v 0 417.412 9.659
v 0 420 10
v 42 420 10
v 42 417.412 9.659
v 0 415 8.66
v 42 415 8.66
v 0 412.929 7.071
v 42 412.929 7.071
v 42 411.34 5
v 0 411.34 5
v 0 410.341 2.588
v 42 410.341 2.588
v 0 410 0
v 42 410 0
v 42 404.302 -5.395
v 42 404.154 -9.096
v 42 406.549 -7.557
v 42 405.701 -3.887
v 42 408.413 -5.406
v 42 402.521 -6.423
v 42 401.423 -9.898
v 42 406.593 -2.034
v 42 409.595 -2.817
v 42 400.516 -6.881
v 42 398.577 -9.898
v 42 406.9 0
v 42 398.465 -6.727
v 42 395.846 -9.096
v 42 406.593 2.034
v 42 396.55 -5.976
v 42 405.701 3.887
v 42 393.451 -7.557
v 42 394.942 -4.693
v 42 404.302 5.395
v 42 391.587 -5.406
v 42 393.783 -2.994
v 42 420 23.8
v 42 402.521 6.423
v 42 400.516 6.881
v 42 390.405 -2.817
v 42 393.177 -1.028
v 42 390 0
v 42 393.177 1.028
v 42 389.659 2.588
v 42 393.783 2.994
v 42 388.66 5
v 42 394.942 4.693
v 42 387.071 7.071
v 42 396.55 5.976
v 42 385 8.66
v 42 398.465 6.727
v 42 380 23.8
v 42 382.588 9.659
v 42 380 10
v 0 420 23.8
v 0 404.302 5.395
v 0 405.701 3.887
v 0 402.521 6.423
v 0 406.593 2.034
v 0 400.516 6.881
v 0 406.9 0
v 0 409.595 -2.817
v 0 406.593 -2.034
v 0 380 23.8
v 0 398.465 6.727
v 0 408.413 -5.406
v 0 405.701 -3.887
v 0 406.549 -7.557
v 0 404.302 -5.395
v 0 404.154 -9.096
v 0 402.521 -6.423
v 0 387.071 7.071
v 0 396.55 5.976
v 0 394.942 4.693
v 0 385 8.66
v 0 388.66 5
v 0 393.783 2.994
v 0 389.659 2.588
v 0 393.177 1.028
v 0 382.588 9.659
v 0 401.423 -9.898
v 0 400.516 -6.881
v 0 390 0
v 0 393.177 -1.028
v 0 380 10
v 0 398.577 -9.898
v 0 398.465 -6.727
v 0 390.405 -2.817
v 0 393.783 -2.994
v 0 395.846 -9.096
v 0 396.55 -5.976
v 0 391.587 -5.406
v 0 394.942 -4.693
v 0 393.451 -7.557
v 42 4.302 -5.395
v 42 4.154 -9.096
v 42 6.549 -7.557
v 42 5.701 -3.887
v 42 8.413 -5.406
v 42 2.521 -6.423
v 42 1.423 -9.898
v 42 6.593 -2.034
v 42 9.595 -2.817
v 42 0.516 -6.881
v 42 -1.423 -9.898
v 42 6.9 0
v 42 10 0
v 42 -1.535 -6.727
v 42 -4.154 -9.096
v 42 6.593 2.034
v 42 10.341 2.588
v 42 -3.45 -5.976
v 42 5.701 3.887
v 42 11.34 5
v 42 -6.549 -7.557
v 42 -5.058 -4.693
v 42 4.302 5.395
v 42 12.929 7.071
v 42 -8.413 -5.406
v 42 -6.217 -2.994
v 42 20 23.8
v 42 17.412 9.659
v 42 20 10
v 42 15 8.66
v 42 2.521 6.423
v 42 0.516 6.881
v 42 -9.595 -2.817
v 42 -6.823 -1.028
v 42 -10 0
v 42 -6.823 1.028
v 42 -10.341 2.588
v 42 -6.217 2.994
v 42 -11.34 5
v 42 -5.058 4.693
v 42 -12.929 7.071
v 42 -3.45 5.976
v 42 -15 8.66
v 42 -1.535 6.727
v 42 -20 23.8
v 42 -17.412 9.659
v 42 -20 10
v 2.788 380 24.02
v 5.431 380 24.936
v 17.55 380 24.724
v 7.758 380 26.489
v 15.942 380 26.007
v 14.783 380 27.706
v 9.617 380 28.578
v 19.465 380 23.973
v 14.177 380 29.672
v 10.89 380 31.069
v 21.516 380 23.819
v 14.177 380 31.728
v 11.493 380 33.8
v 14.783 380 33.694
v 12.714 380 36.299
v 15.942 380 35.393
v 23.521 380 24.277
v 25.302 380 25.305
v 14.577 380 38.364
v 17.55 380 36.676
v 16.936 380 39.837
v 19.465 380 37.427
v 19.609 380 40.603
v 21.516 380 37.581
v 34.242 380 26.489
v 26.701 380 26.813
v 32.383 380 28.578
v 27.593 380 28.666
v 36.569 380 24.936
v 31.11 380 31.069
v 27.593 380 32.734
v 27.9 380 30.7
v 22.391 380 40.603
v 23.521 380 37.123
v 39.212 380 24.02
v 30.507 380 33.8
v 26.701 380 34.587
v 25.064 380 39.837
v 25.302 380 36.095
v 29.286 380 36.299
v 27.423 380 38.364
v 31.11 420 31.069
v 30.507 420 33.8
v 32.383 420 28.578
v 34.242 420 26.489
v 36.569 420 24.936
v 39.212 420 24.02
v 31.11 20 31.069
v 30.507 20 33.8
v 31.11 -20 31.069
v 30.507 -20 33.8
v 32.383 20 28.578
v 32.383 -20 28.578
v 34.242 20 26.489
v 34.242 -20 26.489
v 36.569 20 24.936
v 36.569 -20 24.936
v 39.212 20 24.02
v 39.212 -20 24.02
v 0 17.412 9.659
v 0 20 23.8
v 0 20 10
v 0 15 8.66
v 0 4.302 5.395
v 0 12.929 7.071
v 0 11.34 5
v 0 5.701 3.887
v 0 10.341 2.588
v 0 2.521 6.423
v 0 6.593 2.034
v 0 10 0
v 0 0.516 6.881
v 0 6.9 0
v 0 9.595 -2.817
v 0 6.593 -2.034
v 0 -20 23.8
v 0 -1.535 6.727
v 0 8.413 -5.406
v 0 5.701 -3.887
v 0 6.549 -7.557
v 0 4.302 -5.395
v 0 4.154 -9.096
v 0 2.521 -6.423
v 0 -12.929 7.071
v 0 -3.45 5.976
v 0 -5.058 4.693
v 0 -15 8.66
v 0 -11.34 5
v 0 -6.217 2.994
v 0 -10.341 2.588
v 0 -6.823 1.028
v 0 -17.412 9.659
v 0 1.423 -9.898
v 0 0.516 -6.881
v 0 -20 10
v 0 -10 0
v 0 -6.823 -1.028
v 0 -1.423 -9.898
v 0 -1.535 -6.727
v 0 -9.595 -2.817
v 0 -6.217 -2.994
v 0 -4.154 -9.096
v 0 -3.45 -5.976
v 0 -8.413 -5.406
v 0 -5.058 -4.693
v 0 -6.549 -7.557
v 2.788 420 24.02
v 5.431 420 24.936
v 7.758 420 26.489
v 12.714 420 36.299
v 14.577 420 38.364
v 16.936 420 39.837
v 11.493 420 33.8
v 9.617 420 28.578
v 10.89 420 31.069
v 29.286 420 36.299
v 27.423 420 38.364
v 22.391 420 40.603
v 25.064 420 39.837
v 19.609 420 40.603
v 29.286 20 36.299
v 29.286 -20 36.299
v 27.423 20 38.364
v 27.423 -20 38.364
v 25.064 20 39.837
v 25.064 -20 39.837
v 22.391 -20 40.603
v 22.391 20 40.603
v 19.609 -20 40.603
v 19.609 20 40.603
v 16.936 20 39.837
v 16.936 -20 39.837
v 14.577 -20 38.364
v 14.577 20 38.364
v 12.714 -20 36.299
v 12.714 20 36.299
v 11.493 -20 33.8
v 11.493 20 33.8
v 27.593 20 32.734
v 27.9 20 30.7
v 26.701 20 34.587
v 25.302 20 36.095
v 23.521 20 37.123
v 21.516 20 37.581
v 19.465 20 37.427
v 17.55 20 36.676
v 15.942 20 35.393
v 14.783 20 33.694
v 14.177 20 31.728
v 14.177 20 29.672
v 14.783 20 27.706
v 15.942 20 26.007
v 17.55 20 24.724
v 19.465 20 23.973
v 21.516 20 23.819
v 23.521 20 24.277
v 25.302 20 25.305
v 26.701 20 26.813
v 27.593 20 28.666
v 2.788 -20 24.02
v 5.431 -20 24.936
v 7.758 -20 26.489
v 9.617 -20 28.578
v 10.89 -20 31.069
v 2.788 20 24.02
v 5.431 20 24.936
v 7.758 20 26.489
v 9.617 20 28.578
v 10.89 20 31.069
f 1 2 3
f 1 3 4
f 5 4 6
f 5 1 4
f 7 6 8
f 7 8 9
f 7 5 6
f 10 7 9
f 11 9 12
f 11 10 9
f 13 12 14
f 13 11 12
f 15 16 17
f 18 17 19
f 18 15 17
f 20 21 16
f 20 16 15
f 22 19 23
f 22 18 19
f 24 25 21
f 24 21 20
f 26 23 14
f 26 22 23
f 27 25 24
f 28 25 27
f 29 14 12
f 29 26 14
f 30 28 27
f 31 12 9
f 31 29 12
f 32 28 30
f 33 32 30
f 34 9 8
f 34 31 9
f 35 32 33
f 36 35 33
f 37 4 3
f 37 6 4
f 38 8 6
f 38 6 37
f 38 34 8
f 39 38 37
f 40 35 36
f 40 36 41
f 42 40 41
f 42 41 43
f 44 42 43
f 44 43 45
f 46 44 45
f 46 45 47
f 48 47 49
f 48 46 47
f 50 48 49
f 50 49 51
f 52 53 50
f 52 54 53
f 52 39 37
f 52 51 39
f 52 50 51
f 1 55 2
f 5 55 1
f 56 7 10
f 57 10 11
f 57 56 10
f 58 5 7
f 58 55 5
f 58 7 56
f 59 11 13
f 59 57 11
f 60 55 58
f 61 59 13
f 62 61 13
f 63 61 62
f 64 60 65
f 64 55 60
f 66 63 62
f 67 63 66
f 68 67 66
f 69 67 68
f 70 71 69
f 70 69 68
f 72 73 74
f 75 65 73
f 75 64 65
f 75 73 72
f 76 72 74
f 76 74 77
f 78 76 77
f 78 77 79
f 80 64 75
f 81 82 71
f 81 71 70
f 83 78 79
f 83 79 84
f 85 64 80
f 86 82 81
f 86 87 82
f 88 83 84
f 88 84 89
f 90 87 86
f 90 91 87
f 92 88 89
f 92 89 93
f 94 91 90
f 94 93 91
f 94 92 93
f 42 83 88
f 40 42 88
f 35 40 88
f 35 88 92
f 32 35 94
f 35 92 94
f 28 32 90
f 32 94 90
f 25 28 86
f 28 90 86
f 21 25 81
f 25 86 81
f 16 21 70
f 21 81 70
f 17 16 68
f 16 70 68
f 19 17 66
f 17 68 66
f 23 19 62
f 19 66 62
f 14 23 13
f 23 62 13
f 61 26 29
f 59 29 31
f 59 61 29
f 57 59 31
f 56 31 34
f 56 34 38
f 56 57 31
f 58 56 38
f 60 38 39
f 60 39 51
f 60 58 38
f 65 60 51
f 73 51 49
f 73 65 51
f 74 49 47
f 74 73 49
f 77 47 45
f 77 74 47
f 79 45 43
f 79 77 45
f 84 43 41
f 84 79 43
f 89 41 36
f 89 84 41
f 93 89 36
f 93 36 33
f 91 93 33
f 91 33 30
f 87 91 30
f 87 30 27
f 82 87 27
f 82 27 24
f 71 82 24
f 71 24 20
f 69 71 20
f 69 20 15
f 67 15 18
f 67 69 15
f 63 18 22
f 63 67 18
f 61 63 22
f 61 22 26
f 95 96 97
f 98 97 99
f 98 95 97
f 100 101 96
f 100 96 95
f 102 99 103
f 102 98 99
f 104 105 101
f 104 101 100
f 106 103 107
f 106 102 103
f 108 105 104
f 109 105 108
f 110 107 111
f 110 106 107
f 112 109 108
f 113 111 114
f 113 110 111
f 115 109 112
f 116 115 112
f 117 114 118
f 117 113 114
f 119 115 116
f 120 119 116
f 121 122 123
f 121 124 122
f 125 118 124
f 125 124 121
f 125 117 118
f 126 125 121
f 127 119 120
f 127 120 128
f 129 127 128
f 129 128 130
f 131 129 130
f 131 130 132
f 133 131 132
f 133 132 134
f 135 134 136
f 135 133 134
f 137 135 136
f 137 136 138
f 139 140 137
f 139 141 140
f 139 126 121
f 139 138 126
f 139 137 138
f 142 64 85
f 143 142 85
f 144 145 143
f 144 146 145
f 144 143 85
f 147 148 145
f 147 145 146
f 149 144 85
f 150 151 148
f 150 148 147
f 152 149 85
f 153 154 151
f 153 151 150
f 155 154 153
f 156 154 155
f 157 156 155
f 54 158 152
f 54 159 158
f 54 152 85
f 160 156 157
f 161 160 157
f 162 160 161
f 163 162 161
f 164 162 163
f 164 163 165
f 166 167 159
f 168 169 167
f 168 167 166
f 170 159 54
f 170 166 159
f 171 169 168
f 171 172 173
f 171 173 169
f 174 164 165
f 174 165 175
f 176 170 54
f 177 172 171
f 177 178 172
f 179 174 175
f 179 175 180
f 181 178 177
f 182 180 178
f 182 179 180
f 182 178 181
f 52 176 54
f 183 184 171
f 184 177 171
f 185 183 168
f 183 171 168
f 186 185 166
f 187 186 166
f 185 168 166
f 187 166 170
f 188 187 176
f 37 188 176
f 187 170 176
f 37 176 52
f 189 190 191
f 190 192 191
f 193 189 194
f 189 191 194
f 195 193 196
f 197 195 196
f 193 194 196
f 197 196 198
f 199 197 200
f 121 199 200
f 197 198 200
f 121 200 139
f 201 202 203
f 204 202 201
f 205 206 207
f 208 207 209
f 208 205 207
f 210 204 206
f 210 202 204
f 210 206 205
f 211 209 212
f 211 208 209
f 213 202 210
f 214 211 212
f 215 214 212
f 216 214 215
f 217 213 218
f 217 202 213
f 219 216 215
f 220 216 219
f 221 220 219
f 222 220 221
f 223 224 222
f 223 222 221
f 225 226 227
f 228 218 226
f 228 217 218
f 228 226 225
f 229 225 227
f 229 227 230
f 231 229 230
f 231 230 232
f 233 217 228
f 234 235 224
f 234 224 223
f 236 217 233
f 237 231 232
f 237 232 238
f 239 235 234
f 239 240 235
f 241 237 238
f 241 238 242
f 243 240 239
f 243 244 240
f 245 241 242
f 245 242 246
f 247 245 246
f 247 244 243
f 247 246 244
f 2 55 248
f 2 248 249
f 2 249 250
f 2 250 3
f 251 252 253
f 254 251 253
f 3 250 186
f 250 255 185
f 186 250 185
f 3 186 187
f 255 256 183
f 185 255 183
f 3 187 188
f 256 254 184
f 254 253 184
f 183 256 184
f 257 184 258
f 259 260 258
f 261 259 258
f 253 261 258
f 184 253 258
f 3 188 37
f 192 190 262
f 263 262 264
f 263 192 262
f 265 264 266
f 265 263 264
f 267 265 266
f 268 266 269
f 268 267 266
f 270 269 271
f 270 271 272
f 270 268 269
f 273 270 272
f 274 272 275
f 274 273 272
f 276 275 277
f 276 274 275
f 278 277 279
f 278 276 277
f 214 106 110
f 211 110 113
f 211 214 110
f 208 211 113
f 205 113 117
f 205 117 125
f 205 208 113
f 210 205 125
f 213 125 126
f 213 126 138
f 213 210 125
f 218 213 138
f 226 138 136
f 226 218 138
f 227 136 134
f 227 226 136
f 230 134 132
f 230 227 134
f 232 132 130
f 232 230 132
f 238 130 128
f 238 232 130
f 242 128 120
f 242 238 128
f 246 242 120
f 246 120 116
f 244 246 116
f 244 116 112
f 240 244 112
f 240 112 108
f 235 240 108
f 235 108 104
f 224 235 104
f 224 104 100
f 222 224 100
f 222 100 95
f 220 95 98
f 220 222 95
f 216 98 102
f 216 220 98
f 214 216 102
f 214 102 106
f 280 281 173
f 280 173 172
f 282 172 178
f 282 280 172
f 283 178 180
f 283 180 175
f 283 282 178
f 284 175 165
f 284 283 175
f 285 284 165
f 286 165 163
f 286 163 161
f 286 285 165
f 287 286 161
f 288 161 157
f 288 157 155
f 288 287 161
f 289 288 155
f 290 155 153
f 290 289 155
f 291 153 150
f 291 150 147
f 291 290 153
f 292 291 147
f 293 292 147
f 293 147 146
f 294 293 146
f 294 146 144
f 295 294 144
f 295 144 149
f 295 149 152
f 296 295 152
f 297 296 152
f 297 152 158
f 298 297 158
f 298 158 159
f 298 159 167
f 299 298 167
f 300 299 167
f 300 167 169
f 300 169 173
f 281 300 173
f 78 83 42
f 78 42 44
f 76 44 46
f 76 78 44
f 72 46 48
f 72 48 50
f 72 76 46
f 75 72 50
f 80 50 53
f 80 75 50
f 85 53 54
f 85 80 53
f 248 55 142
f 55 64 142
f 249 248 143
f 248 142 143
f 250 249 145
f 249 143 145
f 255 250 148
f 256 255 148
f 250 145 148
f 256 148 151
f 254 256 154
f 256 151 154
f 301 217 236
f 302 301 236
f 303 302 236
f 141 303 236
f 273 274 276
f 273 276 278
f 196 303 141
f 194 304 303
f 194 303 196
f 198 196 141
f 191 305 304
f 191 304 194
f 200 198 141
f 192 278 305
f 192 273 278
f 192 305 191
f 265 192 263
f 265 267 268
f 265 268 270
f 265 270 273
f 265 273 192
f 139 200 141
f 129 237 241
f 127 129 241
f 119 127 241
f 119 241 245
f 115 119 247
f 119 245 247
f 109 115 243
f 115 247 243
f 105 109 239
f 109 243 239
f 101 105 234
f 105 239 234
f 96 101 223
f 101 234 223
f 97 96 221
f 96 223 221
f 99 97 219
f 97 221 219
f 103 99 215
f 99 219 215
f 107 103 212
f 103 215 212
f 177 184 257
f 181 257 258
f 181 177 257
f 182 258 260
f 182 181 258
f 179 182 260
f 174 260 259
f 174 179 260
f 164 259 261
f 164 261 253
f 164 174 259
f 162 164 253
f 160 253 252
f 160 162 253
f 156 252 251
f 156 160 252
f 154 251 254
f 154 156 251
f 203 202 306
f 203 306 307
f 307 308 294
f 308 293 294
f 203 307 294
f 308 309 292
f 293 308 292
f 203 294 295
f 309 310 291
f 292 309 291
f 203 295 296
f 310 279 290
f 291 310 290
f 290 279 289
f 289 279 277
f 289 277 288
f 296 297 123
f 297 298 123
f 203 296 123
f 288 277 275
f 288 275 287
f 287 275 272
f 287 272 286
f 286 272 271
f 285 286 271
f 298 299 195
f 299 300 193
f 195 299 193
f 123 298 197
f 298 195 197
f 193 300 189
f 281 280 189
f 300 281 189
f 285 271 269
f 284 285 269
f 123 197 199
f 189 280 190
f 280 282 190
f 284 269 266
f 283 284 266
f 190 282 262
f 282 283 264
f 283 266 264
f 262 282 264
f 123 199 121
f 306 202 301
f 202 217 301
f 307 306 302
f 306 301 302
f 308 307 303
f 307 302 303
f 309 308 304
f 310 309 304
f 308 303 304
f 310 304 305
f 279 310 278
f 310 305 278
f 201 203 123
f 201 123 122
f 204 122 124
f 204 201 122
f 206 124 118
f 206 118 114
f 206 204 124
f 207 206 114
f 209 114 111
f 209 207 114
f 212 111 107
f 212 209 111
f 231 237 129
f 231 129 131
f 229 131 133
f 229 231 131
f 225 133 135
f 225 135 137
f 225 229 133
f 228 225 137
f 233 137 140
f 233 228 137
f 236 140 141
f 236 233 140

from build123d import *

# Parameters (mm, degrees)
SKETCH011_R  = 6.9
PAD001_DEPTH = 42
SKETCH012_R  = 6.9
PAD002_DEPTH = 42
SKETCH014_R  = 6.9
PAD004_DEPTH = 20
SKETCH015_R  = 6.9
PAD005_DEPTH = 20
SKETCH016_R  = 6.9
PAD006_DEPTH = 440


with BuildPart() as x_axis_sled1:
    # Sketch011 → Pad001 (new body)
    with BuildSketch(Plane.YZ):
        with BuildLine():
            Line((-20, 16.9), (20, 16.9))
            Line((20, 16.9), (20, 10))
            ThreePointArc((20, 10), (12.928932, 7.071068), (10, 0))
            ThreePointArc((-10, 0), (0, -9.999999), (10, 0))
            ThreePointArc((-10, 0), (-12.928932, 7.071068), (-20, 10))
            Line((-20, 10), (-20, 16.9))
        make_face()
        Circle(SKETCH011_R, mode=Mode.SUBTRACT)
    extrude(amount=PAD001_DEPTH)


with BuildPart() as x_axis_sled2:
    # Sketch012 → Pad002 (new body)
    with BuildSketch(Plane(origin=(0, 400, 0), x_dir=(0, 1, 0), z_dir=(1, 0, 0))):
        with BuildLine():
            Line((-20, 16.9), (20, 16.9))
            Line((20, 16.9), (20, 10))
            ThreePointArc((20, 10), (12.928932, 7.071068), (10, 0))
            ThreePointArc((-10, 0), (0, -9.999999), (10, 0))
            ThreePointArc((-10, 0), (-12.928932, 7.071068), (-20, 10))
            Line((-20, 10), (-20, 16.9))
        make_face()
        Circle(SKETCH012_R, mode=Mode.SUBTRACT)
    extrude(amount=PAD002_DEPTH)


with BuildPart() as y_axis_socket1:
    # Sketch014 → Pad004 (new body, symmetric)
    with BuildSketch(Plane.XZ):
        with BuildLine():
            Line((0, 23.8), (0, 16.9))
            Line((0, 16.9), (42, 16.9))
            Line((42, 16.9), (42, 23.8))
            ThreePointArc((30.507366, 33.8), (34.242407, 26.488514), (42, 23.8))
            ThreePointArc((30.507366, 33.8), (21, 40.7), (11.492634, 33.8))
            ThreePointArc((0, 23.8), (7.757593, 26.488514), (11.492634, 33.8))
        make_face()
        with Locations((21, 30.7)):
            Circle(SKETCH014_R, mode=Mode.SUBTRACT)
    extrude(amount=PAD004_DEPTH, both=True)


with BuildPart() as y_axis_socket2:
    # Sketch015 → Pad005 (new body, symmetric)
    with BuildSketch(Plane.XZ.offset(-400)):
        with BuildLine():
            Line((0, 23.8), (0, 16.9))
            Line((0, 16.9), (42, 16.9))
            Line((42, 16.9), (42, 23.8))
            ThreePointArc((30.507366, 33.8), (34.242407, 26.488514), (42, 23.8))
            ThreePointArc((30.507366, 33.8), (21, 40.7), (11.492634, 33.8))
            ThreePointArc((0, 23.8), (7.757593, 26.488514), (11.492634, 33.8))
        make_face()
        with Locations((21, 30.7)):
            Circle(SKETCH015_R, mode=Mode.SUBTRACT)
    extrude(amount=PAD005_DEPTH, both=True)


with BuildPart() as y_rail:
    # Sketch016 → Pad006 (new body)
    with BuildSketch(Plane.XZ.offset(20)):
        with Locations((21, 30.7)):
            Circle(SKETCH016_R)
    extrude(amount=-PAD006_DEPTH)

    # Fusion: union X_Axis_Sled1, X_Axis_Sled2, Y_Axis_Socket1, Y_Axis_Socket2
    add(x_axis_sled1.part)
    add(x_axis_sled2.part)
    add(y_axis_socket1.part)
    add(y_axis_socket2.part)


solid = y_rail.part
